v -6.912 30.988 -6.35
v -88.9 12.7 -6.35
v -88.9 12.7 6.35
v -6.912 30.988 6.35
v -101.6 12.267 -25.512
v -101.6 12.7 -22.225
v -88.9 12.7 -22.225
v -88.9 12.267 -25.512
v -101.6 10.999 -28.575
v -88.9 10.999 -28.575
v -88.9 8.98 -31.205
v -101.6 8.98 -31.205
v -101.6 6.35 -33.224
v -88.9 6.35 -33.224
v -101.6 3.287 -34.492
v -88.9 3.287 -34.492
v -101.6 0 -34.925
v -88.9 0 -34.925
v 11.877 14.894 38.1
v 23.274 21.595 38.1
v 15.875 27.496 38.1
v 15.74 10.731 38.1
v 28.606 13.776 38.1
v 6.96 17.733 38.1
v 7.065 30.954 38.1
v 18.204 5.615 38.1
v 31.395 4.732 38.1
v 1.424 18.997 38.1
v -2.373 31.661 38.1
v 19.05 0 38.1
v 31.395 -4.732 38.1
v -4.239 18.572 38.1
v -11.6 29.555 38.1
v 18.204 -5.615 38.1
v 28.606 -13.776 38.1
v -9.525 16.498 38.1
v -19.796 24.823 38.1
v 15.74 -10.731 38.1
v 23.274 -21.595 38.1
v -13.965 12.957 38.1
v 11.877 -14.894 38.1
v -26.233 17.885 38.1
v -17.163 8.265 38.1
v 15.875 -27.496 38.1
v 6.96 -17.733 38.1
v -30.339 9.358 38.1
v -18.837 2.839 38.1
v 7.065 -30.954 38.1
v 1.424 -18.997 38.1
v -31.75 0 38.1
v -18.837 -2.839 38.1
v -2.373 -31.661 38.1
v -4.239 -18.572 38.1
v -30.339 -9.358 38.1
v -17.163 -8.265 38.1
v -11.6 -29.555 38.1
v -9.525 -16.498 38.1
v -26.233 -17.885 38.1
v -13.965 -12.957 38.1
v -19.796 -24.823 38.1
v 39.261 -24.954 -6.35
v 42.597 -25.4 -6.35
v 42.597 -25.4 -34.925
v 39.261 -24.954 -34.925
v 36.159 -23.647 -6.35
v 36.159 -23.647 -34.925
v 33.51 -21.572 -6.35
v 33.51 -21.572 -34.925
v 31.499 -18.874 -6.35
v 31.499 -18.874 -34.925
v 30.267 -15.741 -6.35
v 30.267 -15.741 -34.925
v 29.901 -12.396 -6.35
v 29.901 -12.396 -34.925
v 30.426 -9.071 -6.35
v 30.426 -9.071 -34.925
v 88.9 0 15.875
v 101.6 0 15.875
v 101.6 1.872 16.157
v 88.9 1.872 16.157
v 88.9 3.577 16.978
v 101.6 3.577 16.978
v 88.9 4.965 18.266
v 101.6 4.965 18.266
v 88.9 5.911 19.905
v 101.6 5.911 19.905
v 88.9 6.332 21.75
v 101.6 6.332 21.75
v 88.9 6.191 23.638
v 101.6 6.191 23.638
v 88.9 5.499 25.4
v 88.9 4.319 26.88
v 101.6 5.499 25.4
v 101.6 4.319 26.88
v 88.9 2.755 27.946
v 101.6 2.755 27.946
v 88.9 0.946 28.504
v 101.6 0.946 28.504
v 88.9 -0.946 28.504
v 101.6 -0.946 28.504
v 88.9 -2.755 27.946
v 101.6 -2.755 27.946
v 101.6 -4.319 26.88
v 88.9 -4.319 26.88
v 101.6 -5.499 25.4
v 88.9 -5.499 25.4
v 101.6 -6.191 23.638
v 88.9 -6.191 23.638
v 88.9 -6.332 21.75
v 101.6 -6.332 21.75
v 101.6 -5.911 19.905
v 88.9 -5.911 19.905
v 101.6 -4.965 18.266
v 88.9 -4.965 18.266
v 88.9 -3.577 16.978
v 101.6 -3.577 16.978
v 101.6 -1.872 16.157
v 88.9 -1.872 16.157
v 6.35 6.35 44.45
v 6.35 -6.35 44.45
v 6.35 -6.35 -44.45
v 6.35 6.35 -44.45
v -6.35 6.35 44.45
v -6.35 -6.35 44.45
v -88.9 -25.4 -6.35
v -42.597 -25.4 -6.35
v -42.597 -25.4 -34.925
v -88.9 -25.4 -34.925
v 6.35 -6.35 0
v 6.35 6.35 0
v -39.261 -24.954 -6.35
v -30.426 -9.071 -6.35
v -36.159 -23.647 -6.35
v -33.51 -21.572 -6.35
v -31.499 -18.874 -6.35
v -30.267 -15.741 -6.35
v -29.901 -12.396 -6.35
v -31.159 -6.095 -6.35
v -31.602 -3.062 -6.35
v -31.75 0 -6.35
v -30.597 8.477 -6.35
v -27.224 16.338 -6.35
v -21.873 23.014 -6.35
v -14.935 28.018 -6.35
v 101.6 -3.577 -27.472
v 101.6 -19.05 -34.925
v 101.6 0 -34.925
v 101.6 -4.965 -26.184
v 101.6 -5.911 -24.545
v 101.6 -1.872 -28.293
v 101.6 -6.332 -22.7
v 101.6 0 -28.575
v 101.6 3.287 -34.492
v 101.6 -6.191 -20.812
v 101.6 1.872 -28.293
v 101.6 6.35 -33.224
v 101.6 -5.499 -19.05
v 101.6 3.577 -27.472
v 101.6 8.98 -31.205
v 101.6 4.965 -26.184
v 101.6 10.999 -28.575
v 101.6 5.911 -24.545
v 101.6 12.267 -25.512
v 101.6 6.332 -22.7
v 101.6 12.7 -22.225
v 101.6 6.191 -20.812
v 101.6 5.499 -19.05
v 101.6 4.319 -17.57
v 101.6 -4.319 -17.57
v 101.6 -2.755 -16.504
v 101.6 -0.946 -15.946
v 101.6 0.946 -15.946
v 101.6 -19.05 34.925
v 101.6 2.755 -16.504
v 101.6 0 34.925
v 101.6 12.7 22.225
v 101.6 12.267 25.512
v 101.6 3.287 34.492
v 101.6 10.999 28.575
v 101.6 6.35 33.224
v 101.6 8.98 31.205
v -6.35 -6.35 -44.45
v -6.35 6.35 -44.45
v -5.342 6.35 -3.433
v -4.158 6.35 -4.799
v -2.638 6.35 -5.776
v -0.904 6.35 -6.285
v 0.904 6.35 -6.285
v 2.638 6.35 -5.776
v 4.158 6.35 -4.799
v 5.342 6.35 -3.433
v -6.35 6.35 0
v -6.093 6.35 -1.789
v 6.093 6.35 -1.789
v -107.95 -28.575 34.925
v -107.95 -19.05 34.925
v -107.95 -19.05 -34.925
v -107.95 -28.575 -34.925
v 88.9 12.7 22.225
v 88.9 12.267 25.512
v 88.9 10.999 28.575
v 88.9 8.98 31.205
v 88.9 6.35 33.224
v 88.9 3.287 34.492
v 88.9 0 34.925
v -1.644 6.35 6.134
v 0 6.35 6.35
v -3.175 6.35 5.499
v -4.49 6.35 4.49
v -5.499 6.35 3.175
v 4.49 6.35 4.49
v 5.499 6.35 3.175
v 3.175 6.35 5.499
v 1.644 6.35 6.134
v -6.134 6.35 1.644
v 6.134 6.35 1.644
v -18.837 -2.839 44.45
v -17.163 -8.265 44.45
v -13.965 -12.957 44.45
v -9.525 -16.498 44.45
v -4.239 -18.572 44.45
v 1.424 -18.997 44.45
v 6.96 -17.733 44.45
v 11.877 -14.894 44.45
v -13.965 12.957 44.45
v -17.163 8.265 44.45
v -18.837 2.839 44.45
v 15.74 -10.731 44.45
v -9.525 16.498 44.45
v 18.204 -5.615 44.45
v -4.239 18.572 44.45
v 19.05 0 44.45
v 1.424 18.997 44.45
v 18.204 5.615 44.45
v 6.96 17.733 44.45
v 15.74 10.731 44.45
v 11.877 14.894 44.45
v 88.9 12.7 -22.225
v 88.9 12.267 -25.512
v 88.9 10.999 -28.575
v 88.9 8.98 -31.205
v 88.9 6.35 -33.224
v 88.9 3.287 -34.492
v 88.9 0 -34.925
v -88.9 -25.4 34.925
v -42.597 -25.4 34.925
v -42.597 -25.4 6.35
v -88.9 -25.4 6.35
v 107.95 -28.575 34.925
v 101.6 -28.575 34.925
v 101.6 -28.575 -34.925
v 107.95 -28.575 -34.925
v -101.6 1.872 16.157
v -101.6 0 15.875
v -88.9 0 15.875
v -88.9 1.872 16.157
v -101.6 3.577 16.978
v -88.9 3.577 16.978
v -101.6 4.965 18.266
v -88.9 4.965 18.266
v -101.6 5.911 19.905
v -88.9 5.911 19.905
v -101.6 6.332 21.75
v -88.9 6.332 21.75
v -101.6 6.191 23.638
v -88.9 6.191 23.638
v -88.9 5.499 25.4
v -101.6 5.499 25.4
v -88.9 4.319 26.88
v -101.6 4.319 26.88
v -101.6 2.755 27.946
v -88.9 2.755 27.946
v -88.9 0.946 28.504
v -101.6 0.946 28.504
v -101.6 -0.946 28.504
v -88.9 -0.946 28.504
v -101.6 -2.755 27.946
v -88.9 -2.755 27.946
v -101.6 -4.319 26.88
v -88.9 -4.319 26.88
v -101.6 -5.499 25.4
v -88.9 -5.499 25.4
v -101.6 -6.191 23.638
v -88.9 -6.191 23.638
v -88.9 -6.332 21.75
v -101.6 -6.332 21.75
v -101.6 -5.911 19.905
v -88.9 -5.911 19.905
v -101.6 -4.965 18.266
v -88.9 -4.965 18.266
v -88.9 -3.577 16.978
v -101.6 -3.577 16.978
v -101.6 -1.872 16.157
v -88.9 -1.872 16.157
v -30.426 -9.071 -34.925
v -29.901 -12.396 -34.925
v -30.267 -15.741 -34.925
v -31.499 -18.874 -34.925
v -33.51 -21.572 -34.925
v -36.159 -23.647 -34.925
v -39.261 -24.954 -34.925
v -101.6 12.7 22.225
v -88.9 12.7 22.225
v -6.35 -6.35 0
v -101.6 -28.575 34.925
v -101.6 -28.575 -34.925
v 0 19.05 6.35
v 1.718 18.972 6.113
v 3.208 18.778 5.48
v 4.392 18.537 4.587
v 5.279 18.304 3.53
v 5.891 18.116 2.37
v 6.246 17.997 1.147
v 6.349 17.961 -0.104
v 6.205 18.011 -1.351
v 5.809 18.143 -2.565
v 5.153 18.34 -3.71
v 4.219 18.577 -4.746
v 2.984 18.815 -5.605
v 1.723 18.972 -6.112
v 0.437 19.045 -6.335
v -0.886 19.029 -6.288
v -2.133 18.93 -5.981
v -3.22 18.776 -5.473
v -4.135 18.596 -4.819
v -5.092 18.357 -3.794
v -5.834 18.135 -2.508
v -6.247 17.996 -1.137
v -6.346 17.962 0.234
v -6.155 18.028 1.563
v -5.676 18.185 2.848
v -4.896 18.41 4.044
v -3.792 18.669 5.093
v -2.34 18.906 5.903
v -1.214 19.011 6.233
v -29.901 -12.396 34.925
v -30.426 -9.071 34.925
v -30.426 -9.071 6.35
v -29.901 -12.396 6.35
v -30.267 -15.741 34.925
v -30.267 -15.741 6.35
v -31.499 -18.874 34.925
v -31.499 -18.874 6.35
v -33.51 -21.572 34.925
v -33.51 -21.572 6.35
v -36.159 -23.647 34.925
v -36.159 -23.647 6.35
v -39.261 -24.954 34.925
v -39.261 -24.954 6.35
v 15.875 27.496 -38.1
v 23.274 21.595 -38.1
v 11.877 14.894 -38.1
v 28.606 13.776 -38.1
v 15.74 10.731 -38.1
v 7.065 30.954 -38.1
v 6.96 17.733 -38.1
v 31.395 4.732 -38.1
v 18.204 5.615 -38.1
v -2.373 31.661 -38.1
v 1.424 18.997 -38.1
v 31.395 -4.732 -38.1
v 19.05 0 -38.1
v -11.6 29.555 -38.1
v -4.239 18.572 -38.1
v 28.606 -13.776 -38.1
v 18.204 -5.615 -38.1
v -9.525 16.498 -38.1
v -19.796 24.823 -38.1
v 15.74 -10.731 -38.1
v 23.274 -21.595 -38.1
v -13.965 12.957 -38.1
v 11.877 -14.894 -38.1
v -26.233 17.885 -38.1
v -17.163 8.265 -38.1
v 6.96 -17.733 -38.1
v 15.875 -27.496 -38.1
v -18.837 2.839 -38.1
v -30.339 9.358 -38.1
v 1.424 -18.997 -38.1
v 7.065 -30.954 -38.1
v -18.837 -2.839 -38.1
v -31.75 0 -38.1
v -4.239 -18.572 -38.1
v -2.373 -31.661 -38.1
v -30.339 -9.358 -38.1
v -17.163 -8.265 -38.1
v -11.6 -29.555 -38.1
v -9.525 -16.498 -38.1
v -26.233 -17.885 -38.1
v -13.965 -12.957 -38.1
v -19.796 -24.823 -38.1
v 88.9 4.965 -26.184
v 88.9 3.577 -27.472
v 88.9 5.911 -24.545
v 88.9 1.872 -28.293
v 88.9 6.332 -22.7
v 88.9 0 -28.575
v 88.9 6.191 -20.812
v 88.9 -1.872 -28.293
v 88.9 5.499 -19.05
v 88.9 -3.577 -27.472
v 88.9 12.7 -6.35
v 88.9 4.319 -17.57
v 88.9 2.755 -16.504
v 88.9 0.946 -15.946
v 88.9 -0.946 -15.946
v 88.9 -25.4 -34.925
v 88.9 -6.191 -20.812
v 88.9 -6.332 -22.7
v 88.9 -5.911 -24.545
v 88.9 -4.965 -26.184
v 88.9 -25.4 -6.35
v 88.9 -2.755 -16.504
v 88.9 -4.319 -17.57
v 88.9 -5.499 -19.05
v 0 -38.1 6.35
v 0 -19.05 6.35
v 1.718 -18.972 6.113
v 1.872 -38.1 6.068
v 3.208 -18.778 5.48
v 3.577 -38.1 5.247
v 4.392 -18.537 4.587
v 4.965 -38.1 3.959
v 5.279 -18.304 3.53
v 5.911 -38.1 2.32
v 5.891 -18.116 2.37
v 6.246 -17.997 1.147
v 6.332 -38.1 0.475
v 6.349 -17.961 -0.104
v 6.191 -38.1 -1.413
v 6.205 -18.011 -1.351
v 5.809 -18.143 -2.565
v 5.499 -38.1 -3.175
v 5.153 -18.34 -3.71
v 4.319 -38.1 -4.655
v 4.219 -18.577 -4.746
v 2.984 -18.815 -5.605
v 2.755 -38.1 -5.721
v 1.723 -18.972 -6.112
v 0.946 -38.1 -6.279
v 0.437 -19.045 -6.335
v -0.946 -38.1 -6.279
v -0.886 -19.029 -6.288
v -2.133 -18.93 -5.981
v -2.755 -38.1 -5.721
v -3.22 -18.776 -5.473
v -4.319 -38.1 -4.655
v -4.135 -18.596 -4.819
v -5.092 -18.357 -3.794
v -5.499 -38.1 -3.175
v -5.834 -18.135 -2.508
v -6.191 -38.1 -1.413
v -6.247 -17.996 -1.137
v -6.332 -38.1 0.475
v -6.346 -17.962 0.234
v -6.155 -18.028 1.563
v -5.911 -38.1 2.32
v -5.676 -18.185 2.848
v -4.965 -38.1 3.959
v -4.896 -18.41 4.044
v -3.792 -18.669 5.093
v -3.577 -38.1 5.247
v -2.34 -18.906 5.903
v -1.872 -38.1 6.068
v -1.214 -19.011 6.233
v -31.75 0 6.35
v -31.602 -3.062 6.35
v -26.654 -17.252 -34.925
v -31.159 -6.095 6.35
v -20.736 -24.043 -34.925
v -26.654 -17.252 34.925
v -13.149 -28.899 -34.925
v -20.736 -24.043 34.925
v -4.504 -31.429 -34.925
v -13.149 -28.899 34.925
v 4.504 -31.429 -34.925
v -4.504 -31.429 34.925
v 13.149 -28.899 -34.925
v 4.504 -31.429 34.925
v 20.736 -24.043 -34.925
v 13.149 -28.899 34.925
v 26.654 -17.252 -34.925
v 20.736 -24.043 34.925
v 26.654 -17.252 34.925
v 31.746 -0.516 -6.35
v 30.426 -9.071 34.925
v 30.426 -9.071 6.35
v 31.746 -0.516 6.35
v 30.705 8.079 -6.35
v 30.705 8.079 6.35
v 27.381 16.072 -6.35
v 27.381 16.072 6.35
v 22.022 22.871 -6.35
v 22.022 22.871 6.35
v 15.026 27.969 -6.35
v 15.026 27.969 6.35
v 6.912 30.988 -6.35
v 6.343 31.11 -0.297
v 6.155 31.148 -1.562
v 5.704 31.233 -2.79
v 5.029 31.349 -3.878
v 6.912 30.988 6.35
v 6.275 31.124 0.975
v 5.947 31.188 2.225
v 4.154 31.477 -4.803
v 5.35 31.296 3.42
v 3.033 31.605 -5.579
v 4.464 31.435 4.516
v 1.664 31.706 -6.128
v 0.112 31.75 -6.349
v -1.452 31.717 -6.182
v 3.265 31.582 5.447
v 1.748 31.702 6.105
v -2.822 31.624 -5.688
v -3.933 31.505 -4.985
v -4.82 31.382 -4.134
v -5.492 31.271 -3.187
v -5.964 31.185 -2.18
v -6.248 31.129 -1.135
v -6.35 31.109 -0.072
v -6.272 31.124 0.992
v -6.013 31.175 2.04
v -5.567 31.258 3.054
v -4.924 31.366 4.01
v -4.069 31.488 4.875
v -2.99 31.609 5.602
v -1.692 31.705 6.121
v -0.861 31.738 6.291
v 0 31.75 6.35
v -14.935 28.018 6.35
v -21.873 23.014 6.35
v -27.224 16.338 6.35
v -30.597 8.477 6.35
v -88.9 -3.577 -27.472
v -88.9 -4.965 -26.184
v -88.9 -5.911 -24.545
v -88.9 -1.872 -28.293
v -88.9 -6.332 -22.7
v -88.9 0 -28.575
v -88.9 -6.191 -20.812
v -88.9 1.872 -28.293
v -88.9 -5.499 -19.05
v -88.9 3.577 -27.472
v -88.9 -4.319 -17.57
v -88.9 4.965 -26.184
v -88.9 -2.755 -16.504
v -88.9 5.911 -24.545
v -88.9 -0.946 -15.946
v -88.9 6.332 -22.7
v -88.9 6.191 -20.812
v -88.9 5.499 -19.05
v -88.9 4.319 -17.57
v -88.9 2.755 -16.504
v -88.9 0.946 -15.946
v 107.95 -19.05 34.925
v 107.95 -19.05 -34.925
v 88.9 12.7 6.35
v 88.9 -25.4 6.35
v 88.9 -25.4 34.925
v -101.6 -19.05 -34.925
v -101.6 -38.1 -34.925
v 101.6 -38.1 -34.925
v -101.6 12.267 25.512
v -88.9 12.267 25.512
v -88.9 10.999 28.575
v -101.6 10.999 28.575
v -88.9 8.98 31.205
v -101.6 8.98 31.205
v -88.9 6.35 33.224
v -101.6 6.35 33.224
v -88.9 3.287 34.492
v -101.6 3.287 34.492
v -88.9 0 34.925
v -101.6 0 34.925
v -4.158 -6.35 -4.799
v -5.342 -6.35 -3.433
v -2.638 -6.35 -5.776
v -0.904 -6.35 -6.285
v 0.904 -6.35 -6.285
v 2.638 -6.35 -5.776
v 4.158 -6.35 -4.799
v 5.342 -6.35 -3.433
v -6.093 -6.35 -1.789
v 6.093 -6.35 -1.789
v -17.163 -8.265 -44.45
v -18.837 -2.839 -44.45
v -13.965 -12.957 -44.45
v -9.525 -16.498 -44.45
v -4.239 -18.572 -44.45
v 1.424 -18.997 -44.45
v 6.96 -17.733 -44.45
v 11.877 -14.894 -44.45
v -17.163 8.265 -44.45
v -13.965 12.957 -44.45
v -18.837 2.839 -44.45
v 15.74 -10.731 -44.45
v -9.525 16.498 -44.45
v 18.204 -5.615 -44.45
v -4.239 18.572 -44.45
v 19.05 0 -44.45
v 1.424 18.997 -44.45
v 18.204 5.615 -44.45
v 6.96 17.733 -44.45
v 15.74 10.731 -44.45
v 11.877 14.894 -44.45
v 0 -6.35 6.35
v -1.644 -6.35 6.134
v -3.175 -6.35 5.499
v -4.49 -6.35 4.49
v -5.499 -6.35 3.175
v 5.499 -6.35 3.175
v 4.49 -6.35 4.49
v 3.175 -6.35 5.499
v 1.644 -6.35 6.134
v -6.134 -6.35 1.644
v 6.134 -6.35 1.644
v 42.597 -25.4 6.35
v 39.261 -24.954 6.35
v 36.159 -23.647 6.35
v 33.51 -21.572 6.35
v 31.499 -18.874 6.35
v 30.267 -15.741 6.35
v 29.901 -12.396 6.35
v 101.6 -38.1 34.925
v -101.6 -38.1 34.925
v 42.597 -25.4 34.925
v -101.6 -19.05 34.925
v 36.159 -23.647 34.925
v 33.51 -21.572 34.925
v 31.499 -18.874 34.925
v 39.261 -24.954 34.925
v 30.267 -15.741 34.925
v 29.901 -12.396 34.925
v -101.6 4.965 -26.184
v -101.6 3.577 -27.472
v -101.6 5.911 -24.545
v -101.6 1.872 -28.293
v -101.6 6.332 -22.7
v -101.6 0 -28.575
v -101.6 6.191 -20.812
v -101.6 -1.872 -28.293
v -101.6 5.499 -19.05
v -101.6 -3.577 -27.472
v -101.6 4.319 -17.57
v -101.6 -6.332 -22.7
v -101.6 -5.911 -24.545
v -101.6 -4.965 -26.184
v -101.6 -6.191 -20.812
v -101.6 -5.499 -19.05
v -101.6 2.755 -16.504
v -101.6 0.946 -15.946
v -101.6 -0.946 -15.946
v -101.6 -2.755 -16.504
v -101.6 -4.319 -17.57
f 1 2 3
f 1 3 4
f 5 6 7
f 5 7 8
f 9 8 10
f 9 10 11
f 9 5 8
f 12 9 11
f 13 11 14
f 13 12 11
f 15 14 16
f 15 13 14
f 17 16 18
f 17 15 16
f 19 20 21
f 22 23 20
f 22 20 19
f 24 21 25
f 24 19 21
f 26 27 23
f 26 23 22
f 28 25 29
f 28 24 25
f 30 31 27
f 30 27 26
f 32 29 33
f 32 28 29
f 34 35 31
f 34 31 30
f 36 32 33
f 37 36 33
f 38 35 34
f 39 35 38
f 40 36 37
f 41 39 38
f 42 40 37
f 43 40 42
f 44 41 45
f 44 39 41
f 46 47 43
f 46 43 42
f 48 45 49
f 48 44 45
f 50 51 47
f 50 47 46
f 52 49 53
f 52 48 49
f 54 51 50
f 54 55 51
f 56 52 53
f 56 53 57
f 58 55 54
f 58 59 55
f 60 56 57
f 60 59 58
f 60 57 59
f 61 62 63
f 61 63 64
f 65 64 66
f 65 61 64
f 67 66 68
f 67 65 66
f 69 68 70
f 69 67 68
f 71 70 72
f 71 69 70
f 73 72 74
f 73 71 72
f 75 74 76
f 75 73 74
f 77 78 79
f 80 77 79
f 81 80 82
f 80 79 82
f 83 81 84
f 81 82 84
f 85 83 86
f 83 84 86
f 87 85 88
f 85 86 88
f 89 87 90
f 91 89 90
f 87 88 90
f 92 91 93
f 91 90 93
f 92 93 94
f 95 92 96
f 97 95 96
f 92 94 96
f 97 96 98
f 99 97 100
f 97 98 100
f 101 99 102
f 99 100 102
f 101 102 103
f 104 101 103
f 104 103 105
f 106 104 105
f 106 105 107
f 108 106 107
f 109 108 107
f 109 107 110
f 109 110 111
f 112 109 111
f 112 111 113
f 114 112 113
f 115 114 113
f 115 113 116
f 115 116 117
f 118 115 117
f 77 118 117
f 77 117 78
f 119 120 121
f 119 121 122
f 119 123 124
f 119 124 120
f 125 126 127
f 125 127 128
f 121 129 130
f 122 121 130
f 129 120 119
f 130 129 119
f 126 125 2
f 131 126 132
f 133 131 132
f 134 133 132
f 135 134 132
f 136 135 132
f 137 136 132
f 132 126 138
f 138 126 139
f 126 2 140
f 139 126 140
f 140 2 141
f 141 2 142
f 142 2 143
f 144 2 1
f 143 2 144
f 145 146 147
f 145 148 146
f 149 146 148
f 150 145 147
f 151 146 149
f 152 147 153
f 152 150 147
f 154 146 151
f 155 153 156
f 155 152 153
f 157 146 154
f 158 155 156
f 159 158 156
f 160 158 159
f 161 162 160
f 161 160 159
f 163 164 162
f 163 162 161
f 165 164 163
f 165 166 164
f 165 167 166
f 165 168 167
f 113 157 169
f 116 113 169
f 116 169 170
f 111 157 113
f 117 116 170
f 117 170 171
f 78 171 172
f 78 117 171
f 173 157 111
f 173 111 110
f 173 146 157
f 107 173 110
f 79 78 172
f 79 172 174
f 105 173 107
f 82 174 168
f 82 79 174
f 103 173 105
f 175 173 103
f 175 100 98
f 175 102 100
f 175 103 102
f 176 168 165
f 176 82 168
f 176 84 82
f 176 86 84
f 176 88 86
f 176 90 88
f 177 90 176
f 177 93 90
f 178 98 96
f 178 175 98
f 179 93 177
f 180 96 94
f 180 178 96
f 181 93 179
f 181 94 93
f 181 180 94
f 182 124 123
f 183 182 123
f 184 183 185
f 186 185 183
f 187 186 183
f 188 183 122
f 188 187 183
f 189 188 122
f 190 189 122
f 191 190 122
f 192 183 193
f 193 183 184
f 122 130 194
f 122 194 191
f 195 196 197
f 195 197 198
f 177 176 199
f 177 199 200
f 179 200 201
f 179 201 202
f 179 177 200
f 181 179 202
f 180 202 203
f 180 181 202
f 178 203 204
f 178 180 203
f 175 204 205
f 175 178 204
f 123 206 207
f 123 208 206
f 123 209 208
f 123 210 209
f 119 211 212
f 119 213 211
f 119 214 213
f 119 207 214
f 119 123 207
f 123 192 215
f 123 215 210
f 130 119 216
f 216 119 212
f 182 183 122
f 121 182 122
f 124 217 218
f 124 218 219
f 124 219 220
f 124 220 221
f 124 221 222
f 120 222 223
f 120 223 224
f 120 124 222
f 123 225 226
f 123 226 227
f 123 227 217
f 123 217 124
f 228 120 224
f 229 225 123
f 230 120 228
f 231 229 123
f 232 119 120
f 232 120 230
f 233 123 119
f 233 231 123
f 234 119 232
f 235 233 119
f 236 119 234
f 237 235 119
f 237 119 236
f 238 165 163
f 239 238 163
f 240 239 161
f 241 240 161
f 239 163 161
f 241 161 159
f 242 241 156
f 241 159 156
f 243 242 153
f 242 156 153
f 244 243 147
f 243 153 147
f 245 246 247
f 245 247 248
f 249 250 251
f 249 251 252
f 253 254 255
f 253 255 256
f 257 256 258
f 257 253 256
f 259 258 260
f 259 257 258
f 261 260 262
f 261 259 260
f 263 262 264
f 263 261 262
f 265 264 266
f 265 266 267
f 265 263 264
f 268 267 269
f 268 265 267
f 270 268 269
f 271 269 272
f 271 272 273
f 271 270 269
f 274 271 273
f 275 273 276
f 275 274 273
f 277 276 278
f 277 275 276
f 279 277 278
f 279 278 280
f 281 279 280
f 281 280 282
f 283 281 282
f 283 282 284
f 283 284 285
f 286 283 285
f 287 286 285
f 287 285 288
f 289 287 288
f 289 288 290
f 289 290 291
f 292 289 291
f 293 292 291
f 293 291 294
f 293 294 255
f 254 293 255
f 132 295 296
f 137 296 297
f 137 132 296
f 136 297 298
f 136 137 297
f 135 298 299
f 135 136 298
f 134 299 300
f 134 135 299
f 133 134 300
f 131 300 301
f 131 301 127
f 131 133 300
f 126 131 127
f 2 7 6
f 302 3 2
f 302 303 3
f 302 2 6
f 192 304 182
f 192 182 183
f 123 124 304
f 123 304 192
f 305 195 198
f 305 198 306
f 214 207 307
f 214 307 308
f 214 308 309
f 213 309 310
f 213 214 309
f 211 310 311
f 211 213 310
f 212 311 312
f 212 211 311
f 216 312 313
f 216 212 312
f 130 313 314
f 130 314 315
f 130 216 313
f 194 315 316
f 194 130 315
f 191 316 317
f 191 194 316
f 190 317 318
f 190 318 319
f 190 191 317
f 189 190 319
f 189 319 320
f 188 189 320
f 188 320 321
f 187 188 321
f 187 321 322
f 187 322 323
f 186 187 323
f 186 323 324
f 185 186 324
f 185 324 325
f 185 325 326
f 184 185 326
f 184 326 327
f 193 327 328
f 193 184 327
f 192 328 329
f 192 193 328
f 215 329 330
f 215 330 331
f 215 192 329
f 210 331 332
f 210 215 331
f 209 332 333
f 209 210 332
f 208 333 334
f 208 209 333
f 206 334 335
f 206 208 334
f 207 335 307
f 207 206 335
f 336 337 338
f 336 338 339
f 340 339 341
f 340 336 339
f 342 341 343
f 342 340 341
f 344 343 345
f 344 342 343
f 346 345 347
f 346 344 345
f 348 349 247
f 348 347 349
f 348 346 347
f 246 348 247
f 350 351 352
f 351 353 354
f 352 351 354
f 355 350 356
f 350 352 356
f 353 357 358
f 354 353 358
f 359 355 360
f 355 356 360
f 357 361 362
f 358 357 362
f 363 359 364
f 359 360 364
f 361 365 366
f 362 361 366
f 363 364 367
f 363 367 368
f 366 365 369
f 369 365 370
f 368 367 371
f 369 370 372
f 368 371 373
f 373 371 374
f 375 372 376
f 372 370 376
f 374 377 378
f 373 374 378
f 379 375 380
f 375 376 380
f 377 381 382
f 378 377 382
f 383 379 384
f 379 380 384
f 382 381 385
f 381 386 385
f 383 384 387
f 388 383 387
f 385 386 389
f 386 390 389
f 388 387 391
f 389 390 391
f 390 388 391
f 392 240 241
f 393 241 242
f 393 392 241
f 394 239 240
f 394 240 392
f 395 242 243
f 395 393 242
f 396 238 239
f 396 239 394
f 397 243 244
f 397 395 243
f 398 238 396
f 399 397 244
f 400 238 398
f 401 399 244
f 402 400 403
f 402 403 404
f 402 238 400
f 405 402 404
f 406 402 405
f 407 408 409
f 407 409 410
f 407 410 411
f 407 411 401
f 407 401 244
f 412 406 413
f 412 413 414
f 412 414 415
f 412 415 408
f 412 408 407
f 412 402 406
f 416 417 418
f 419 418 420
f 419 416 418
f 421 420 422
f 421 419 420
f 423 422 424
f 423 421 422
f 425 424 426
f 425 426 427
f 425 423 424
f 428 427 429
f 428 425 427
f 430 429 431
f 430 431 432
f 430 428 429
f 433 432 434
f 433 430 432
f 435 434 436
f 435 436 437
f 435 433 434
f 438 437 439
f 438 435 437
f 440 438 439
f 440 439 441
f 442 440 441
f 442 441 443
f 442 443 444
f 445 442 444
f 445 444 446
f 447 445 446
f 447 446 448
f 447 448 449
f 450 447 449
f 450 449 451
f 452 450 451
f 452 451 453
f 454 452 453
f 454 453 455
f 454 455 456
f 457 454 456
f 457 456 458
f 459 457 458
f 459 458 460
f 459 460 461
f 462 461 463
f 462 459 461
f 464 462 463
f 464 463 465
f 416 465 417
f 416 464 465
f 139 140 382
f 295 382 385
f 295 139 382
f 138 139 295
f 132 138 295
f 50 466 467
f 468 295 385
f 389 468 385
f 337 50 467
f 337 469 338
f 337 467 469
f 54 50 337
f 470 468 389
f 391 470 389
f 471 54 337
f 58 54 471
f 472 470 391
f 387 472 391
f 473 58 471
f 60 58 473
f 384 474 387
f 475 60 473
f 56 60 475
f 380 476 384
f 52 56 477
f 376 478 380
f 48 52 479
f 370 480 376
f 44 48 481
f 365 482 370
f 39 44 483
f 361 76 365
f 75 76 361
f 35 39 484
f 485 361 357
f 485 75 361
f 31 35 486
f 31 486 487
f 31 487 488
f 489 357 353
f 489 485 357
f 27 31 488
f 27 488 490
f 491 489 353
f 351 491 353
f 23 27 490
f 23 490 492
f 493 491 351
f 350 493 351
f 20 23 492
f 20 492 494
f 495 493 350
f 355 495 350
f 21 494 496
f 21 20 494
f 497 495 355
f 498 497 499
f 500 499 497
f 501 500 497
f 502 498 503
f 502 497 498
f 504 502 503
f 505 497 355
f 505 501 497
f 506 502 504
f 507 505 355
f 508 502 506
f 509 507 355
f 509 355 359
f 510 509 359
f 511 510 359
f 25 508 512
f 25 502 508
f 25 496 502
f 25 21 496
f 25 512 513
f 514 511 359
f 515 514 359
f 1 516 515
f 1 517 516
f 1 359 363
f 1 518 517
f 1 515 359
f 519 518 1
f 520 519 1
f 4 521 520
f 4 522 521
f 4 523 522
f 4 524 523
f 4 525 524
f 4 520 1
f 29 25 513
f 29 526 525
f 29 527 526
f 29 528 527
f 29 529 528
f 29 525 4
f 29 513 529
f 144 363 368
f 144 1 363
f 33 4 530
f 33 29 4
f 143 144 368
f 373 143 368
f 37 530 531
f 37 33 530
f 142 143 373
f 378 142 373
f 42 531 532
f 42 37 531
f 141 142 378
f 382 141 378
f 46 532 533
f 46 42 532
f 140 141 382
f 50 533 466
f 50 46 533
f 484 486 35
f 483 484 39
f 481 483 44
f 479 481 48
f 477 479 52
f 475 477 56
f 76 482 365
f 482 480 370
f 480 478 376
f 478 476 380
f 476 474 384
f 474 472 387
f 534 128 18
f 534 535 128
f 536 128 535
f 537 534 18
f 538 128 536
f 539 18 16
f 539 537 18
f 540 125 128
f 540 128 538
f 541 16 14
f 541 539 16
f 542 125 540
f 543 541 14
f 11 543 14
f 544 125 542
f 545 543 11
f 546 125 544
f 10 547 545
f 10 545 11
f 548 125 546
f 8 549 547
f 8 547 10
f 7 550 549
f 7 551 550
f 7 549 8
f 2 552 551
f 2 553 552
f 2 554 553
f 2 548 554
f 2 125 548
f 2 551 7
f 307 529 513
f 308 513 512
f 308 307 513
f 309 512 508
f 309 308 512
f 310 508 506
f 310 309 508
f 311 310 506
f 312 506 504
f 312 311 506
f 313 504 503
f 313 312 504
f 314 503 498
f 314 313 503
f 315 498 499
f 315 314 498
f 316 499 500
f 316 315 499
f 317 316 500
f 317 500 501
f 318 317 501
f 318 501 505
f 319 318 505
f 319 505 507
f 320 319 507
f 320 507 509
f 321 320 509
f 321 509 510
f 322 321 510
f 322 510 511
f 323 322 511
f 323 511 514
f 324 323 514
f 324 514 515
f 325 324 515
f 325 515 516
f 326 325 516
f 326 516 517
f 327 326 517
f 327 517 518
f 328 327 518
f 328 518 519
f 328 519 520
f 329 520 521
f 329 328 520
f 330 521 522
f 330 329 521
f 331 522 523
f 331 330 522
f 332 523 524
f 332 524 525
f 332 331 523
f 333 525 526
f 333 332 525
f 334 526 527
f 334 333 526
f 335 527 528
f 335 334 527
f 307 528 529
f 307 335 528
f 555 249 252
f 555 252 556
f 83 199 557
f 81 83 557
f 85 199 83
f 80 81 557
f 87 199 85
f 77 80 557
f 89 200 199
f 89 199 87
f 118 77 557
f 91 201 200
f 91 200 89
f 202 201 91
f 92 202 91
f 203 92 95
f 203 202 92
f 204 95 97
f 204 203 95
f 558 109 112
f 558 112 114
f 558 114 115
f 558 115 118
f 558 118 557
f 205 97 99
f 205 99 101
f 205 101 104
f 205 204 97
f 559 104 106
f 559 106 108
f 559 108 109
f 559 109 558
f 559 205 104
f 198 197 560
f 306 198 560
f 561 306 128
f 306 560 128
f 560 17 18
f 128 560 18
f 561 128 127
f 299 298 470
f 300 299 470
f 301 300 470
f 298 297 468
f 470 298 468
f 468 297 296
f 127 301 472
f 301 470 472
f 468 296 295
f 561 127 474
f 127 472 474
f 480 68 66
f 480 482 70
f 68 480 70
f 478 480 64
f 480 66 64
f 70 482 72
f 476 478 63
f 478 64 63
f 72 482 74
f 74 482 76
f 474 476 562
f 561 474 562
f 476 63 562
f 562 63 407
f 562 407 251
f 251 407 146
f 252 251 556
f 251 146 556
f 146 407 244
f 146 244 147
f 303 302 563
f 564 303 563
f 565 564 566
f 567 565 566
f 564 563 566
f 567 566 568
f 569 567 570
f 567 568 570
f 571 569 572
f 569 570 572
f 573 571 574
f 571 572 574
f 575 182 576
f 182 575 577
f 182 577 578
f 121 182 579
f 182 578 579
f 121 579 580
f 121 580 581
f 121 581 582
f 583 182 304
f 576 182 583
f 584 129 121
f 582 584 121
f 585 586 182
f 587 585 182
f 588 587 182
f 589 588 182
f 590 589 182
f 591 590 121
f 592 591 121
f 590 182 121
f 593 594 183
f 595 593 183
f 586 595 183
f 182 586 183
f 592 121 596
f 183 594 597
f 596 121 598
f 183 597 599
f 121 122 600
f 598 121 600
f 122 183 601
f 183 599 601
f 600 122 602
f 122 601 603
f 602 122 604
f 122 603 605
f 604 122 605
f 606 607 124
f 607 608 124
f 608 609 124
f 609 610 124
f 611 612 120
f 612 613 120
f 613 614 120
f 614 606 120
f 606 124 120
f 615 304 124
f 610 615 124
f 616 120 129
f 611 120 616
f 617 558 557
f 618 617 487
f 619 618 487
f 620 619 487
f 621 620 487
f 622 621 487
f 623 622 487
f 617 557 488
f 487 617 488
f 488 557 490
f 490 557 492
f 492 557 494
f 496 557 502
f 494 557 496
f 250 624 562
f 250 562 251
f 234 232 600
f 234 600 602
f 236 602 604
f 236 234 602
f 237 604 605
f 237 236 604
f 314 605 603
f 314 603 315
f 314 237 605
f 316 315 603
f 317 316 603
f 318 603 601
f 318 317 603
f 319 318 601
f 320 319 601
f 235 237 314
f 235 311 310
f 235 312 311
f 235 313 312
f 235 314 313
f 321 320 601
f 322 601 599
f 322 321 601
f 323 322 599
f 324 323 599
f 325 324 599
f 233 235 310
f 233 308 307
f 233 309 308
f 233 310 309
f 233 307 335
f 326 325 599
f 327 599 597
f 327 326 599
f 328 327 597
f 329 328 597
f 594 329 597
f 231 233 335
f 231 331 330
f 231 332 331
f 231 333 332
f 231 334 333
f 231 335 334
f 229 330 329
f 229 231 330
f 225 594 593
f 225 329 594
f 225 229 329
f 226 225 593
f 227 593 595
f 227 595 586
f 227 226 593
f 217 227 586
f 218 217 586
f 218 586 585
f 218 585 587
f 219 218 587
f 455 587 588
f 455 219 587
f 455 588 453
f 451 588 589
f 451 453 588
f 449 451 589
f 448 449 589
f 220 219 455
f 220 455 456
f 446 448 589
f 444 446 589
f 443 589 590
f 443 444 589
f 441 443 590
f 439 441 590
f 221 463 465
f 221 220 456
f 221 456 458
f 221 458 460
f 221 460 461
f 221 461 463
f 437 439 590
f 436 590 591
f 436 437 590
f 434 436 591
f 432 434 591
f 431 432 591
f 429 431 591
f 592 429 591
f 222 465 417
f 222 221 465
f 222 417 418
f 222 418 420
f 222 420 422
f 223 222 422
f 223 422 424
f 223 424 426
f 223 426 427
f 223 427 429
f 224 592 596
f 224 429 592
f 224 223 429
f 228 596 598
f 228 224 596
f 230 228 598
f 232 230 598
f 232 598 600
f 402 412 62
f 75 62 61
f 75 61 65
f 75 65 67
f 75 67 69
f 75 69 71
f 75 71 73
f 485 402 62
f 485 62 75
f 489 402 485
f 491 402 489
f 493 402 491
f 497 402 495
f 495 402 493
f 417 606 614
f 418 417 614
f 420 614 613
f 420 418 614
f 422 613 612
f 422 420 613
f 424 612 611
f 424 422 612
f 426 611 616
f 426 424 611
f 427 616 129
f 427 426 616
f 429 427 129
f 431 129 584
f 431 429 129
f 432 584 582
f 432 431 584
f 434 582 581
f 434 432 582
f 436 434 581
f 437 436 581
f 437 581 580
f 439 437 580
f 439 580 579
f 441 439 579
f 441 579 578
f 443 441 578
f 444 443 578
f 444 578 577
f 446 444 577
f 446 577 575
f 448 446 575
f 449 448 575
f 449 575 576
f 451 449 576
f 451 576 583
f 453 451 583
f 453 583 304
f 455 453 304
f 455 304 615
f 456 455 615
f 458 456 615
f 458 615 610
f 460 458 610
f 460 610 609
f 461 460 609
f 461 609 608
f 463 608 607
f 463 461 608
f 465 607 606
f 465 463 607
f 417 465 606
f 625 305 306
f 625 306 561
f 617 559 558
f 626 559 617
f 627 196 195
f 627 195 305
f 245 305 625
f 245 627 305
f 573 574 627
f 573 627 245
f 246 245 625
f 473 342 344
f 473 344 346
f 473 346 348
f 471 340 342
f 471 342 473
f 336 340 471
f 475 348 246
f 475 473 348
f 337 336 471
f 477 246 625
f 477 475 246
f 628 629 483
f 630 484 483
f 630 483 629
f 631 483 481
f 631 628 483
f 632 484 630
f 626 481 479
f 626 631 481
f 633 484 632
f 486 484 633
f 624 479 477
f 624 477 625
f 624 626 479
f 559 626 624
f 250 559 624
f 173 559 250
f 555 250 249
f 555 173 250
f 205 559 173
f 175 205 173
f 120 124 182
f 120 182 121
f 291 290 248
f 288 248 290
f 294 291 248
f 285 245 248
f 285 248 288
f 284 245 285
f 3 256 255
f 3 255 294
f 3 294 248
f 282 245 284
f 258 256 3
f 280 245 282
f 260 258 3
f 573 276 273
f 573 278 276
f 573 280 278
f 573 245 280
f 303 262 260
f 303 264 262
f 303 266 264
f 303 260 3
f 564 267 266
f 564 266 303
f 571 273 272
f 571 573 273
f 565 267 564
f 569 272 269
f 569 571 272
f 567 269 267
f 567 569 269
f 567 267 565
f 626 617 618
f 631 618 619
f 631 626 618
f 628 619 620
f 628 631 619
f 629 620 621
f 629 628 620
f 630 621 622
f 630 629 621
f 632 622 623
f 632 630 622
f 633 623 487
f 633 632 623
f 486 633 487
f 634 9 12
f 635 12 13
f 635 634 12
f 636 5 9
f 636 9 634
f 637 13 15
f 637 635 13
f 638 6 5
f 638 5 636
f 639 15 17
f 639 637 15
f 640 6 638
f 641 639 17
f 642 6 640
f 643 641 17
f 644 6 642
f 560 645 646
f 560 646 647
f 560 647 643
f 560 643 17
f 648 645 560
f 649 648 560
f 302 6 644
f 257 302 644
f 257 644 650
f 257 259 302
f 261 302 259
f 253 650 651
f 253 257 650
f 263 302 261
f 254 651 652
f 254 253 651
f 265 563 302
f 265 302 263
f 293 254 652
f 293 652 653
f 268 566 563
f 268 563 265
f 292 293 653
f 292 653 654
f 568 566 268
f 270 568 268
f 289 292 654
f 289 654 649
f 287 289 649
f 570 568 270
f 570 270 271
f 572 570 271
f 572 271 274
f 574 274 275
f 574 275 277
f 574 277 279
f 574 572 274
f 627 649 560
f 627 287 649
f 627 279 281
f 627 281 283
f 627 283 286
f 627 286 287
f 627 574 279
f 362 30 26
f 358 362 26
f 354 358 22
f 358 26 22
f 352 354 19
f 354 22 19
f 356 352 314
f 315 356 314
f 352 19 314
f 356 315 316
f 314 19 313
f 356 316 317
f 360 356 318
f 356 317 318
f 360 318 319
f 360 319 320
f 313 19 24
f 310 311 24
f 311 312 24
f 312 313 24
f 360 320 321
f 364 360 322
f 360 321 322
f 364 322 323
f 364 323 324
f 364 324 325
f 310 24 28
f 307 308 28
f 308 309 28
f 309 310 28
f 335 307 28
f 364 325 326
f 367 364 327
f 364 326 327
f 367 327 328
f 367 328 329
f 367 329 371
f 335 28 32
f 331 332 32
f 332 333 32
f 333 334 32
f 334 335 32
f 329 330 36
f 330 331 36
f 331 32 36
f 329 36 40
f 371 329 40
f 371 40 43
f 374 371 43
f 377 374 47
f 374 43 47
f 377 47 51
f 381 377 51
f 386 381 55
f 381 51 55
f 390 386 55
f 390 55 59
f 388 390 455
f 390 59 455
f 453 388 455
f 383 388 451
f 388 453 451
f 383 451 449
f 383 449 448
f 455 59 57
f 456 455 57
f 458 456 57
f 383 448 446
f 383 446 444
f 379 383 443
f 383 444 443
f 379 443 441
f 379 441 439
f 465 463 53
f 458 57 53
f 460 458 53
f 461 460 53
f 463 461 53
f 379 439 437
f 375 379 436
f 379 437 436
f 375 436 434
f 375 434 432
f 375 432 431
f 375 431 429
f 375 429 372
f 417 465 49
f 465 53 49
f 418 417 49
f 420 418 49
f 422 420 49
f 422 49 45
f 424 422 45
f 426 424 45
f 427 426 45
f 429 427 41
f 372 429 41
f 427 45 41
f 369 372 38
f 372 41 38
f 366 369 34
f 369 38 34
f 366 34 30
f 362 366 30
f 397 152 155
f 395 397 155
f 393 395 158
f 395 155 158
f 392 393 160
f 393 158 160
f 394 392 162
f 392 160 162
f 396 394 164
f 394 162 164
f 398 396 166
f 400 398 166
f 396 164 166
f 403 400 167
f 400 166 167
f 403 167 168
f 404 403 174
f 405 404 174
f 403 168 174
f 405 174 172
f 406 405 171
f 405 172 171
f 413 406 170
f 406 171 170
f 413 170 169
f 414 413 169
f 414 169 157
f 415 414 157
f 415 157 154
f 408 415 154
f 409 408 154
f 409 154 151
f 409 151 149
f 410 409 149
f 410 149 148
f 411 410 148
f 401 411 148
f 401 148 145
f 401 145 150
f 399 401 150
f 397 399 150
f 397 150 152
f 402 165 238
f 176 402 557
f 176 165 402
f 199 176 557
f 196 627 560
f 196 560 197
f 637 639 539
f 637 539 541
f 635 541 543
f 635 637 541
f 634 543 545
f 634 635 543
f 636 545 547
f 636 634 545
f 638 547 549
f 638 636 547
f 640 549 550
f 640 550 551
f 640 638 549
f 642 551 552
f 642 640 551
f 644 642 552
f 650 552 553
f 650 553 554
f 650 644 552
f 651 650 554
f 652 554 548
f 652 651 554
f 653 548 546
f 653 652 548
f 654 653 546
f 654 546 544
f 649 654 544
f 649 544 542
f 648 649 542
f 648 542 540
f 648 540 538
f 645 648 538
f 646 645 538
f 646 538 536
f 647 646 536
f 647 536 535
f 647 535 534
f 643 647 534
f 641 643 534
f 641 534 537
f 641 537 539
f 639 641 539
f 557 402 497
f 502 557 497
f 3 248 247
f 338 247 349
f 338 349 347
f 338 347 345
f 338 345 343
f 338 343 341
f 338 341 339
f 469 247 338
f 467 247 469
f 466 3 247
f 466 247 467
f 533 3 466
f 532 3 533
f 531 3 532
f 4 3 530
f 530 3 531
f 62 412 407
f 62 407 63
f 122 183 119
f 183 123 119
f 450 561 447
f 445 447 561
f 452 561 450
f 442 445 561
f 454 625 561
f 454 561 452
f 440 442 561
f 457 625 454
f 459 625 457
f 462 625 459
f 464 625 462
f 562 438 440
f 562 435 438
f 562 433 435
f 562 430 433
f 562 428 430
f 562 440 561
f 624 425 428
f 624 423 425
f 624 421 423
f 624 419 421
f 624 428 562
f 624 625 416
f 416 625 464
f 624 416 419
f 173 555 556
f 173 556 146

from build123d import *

# Parameters (mm, degrees)
SKETCH1_R               = 31.75
BOSS_EXTRUDE1_DEPTH     = 38.1
BOSS_EXTRUDE3_DEPTH     = 34.925
RIB2_REACH              = 122.65
SKETCH5_WALL_W          = 327.302604126
SKETCH5_WALL_H          = 12.7
SKETCH10_R              = 19.05
CUT_EXTRUDE5_DEPTH      = 44.45
SKETCH6_R               = 19.05
BOSS_EXTRUDE8_DEPTH     = 44.45
SKETCH7_W               = 12.7
SKETCH7_H               = 12.7
CUT_EXTRUDE6_DEPTH      = 44.45
SKETCH7_2_W             = 12.7
SKETCH7_2_H             = 12.7
BOSS_EXTRUDE9_DEPTH     = 44.45
CUT_EXTRUDE7_REACH      = 219.574
SKETCH13_R              = 6.35
CUT_EXTRUDE8_REACH      = 219.574
MIRROR4_COPY_1_REACH    = 219.574
CUT_EXTRUDE9_DEPTH      = 123.803155497
CUT_EXTRUDE9_DEPTH_BACK = 123.803155497
SKETCH15_R              = 6.35


with BuildPart() as part:
    # Sketch1 → Boss-Extrude1 (new, symmetric)
    with BuildSketch(Plane.XY):
        with Locations(Location((0, 0, 0), (0, 0, 180))):
            Circle(SKETCH1_R)
    extrude(amount=BOSS_EXTRUDE1_DEPTH, both=True)

    # Sketch4 → Boss-Extrude3 (add, symmetric)
    with BuildSketch(Plane.XY):
        with BuildLine():
            Line((-101.6, 12.7), (-101.6, -19.05))
            Line((-101.6, -19.05), (-107.95, -19.05))
            Line((-107.95, -19.05), (-107.95, -28.575))
            Line((-107.95, -28.575), (-101.6, -28.575))
            Line((-101.6, -28.575), (-101.6, -38.1))
            Line((-101.6, -38.1), (101.6, -38.1))
            Line((101.6, -38.1), (101.6, -28.575))
            Line((101.6, -28.575), (107.95, -28.575))
            Line((107.95, -28.575), (107.95, -19.05))
            Line((107.95, -19.05), (101.6, -19.05))
            Line((101.6, -19.05), (101.6, 12.7))
            Line((101.6, 12.7), (88.9, 12.7))
            Line((88.9, 12.7), (88.9, -25.4))
            Line((88.9, -25.4), (42.597094971, -25.4))
            ThreePointArc((42.597094971, -25.4), (32.414441655, -20.289701669), (30.426496408, -9.071428571))
            ThreePointArc((30.426496408, -9.071428571), (0, -31.75), (-30.426496408, -9.071428571))
            ThreePointArc((-30.426496408, -9.071428571), (-32.414441655, -20.289701669), (-42.597094971, -25.4))
            Line((-42.597094971, -25.4), (-88.9, -25.4))
            Line((-88.9, -25.4), (-88.9, 12.7))
            Line((-88.9, 12.7), (-101.6, 12.7))
        make_face()
    extrude(amount=BOSS_EXTRUDE3_DEPTH, both=True)

    # Sketch5 wall → Rib2 (add, up to next)
    with BuildSketch(Plane(origin=(-47.906184897, 21.844205722, 0), x_dir=(0.976012958873, 0.217712434445, 0), z_dir=(-0.217712434445, 0.976012958873, 0)), mode=Mode.PRIVATE) as rib2_sk1:
        Rectangle(SKETCH5_WALL_W, SKETCH5_WALL_H)
    rib2_tool1 = extrude(rib2_sk1.sketch, amount=-RIB2_REACH, mode=Mode.PRIVATE) - part.part
    rib2 = rib2_tool1.solids().sort_by_distance((-47.906184897, 21.844205722, 0))[0]
    add(rib2)

    # Mirror1: Rib2 across plane
    add(rib2.mirror(Plane(origin=(0, 0, 0), x_dir=(0, 0, 1), z_dir=(1, 0, 0))))

    # Sketch10 → Cut-Extrude5 (cut, symmetric)
    with BuildSketch(Plane.XY):
        Circle(SKETCH10_R)
    extrude(amount=CUT_EXTRUDE5_DEPTH, both=True, mode=Mode.SUBTRACT)

    # Sketch13 → Cut-Extrude7 (cut, up to next)
    with BuildSketch(Plane(origin=(101.6, 0, 0), x_dir=(0, 0, -1), z_dir=(1, 0, 0)), mode=Mode.PRIVATE) as cut_extrude7_sk1:
        with Locations((-22.225, 0)):
            Circle(SKETCH13_R)
    cut_extrude7_tool1 = extrude(cut_extrude7_sk1.sketch, amount=-CUT_EXTRUDE7_REACH, mode=Mode.PRIVATE) & part.part
    # Sketch13 → Cut-Extrude7 (cut, up to next)
    with BuildSketch(Plane(origin=(101.6, 0, 0), x_dir=(0, 0, -1), z_dir=(1, 0, 0)), mode=Mode.PRIVATE) as cut_extrude7_sk2:
        with Locations((22.225, 0)):
            Circle(SKETCH13_R)
    cut_extrude7_tool2 = extrude(cut_extrude7_sk2.sketch, amount=-CUT_EXTRUDE7_REACH, mode=Mode.PRIVATE) & part.part
    cut_extrude7_1 = cut_extrude7_tool1.solids().sort_by_distance((101.6, 0, 22.225))[0]
    add(cut_extrude7_1, mode=Mode.SUBTRACT)
    cut_extrude7_2 = cut_extrude7_tool2.solids().sort_by_distance((101.6, 0, -22.225))[0]
    add(cut_extrude7_2, mode=Mode.SUBTRACT)
    cut_extrude7 = cut_extrude7_1 + cut_extrude7_2  # Cut-Extrude7 as one shape, for the pattern or mirror that repeats it

    # Mirror2: Cut-Extrude7 across plane
    add(cut_extrude7.mirror(Plane(origin=(0, 0, 0), x_dir=(0, 0, 1), z_dir=(1, 0, 0))), mode=Mode.SUBTRACT)

    # Sketch14 → Cut-Extrude8 (cut, up to next)
    with BuildSketch(Plane(origin=(101.6, 0, 0), x_dir=(0, 0, -1), z_dir=(1, 0, 0)), mode=Mode.PRIVATE) as cut_extrude8_sk1:
        with BuildLine():
            Line((-34.925, 12.7), (-22.225, 12.7))
            ThreePointArc((-22.225, 12.7), (-31.205256121, 8.980256121), (-34.925, 0))
            Line((-34.925, 0), (-34.925, 12.7))
        make_face()
    cut_extrude8_tool1 = extrude(cut_extrude8_sk1.sketch, amount=-CUT_EXTRUDE8_REACH, mode=Mode.PRIVATE) & part.part
    cut_extrude8 = cut_extrude8_tool1.solids().sort_by_distance((101.6, 9.863227, 32.088227))[0]
    add(cut_extrude8, mode=Mode.SUBTRACT)

    # Mirror3: Cut-Extrude8 across plane
    add(cut_extrude8.mirror(Plane.XY), mode=Mode.SUBTRACT)

    # Mirror4: Cut-Extrude8 across plane
    add(cut_extrude8.mirror(Plane(origin=(0, 0, 0), x_dir=(0, 0, 1), z_dir=(1, 0, 0))), mode=Mode.SUBTRACT)

    # Mirror4 copy 1 sketch → Mirror4 copy 1 (cut, up to next)
    with BuildSketch(Plane.ZY.offset(101.6), mode=Mode.PRIVATE) as mirror4_copy_1_sk1:
        with BuildLine():
            Line((-34.925, 12.7), (-22.225, 12.7))
            ThreePointArc((-22.225, 12.7), (-31.205256121, 8.980256121), (-34.925, 0))
            Line((-34.925, 0), (-34.925, 12.7))
        make_face()
    mirror4_copy_1_tool1 = extrude(mirror4_copy_1_sk1.sketch, amount=-MIRROR4_COPY_1_REACH, mode=Mode.PRIVATE) & part.part
    add(mirror4_copy_1_tool1.solids().sort_by_distance((-101.6, 9.863227, -32.088227))[0], mode=Mode.SUBTRACT)


with BuildPart() as body_2:
    # Sketch6 → Boss-Extrude8 (new, symmetric)
    with BuildSketch(Plane.XY):
        Circle(SKETCH6_R)
    extrude(amount=BOSS_EXTRUDE8_DEPTH, both=True)

    # Sketch7 → Cut-Extrude6 (cut, symmetric)
    with BuildSketch(Plane.XY):
        Rectangle(SKETCH7_W, SKETCH7_H)
    extrude(amount=CUT_EXTRUDE6_DEPTH, both=True, mode=Mode.SUBTRACT)


with BuildPart() as body_3:
    # Sketch7<2> → Boss-Extrude9 (new, symmetric)
    with BuildSketch(Plane.XY):
        Rectangle(SKETCH7_2_W, SKETCH7_2_H)
    extrude(amount=BOSS_EXTRUDE9_DEPTH, both=True)


with BuildPart() as cut_extrude9_tool:
    # Sketch15 → Cut-Extrude9 (new, two sides: drawn at the far end of the back side and taken through both)
    with BuildSketch(Plane(origin=(0, 0, 0), x_dir=(1, 0, 0), z_dir=(0, 1, 0)).offset(-CUT_EXTRUDE9_DEPTH_BACK)):
        with Locations(Location((0, 0, 0), (0, 0, 270))):
            Circle(SKETCH15_R)
    extrude(amount=CUT_EXTRUDE9_DEPTH + CUT_EXTRUDE9_DEPTH_BACK)


with BuildPart() as body_2_1:
    add(body_2.part)

    # Cut-Extrude9: cut by cut_extrude9_tool
    add(cut_extrude9_tool.part, mode=Mode.SUBTRACT)


with BuildPart() as part_1:
    add(part.part)

    # Cut-Extrude9: cut by cut_extrude9_tool
    add(cut_extrude9_tool.part, mode=Mode.SUBTRACT)


solid = Compound([body_3.part, body_2_1.part, part_1.part])
